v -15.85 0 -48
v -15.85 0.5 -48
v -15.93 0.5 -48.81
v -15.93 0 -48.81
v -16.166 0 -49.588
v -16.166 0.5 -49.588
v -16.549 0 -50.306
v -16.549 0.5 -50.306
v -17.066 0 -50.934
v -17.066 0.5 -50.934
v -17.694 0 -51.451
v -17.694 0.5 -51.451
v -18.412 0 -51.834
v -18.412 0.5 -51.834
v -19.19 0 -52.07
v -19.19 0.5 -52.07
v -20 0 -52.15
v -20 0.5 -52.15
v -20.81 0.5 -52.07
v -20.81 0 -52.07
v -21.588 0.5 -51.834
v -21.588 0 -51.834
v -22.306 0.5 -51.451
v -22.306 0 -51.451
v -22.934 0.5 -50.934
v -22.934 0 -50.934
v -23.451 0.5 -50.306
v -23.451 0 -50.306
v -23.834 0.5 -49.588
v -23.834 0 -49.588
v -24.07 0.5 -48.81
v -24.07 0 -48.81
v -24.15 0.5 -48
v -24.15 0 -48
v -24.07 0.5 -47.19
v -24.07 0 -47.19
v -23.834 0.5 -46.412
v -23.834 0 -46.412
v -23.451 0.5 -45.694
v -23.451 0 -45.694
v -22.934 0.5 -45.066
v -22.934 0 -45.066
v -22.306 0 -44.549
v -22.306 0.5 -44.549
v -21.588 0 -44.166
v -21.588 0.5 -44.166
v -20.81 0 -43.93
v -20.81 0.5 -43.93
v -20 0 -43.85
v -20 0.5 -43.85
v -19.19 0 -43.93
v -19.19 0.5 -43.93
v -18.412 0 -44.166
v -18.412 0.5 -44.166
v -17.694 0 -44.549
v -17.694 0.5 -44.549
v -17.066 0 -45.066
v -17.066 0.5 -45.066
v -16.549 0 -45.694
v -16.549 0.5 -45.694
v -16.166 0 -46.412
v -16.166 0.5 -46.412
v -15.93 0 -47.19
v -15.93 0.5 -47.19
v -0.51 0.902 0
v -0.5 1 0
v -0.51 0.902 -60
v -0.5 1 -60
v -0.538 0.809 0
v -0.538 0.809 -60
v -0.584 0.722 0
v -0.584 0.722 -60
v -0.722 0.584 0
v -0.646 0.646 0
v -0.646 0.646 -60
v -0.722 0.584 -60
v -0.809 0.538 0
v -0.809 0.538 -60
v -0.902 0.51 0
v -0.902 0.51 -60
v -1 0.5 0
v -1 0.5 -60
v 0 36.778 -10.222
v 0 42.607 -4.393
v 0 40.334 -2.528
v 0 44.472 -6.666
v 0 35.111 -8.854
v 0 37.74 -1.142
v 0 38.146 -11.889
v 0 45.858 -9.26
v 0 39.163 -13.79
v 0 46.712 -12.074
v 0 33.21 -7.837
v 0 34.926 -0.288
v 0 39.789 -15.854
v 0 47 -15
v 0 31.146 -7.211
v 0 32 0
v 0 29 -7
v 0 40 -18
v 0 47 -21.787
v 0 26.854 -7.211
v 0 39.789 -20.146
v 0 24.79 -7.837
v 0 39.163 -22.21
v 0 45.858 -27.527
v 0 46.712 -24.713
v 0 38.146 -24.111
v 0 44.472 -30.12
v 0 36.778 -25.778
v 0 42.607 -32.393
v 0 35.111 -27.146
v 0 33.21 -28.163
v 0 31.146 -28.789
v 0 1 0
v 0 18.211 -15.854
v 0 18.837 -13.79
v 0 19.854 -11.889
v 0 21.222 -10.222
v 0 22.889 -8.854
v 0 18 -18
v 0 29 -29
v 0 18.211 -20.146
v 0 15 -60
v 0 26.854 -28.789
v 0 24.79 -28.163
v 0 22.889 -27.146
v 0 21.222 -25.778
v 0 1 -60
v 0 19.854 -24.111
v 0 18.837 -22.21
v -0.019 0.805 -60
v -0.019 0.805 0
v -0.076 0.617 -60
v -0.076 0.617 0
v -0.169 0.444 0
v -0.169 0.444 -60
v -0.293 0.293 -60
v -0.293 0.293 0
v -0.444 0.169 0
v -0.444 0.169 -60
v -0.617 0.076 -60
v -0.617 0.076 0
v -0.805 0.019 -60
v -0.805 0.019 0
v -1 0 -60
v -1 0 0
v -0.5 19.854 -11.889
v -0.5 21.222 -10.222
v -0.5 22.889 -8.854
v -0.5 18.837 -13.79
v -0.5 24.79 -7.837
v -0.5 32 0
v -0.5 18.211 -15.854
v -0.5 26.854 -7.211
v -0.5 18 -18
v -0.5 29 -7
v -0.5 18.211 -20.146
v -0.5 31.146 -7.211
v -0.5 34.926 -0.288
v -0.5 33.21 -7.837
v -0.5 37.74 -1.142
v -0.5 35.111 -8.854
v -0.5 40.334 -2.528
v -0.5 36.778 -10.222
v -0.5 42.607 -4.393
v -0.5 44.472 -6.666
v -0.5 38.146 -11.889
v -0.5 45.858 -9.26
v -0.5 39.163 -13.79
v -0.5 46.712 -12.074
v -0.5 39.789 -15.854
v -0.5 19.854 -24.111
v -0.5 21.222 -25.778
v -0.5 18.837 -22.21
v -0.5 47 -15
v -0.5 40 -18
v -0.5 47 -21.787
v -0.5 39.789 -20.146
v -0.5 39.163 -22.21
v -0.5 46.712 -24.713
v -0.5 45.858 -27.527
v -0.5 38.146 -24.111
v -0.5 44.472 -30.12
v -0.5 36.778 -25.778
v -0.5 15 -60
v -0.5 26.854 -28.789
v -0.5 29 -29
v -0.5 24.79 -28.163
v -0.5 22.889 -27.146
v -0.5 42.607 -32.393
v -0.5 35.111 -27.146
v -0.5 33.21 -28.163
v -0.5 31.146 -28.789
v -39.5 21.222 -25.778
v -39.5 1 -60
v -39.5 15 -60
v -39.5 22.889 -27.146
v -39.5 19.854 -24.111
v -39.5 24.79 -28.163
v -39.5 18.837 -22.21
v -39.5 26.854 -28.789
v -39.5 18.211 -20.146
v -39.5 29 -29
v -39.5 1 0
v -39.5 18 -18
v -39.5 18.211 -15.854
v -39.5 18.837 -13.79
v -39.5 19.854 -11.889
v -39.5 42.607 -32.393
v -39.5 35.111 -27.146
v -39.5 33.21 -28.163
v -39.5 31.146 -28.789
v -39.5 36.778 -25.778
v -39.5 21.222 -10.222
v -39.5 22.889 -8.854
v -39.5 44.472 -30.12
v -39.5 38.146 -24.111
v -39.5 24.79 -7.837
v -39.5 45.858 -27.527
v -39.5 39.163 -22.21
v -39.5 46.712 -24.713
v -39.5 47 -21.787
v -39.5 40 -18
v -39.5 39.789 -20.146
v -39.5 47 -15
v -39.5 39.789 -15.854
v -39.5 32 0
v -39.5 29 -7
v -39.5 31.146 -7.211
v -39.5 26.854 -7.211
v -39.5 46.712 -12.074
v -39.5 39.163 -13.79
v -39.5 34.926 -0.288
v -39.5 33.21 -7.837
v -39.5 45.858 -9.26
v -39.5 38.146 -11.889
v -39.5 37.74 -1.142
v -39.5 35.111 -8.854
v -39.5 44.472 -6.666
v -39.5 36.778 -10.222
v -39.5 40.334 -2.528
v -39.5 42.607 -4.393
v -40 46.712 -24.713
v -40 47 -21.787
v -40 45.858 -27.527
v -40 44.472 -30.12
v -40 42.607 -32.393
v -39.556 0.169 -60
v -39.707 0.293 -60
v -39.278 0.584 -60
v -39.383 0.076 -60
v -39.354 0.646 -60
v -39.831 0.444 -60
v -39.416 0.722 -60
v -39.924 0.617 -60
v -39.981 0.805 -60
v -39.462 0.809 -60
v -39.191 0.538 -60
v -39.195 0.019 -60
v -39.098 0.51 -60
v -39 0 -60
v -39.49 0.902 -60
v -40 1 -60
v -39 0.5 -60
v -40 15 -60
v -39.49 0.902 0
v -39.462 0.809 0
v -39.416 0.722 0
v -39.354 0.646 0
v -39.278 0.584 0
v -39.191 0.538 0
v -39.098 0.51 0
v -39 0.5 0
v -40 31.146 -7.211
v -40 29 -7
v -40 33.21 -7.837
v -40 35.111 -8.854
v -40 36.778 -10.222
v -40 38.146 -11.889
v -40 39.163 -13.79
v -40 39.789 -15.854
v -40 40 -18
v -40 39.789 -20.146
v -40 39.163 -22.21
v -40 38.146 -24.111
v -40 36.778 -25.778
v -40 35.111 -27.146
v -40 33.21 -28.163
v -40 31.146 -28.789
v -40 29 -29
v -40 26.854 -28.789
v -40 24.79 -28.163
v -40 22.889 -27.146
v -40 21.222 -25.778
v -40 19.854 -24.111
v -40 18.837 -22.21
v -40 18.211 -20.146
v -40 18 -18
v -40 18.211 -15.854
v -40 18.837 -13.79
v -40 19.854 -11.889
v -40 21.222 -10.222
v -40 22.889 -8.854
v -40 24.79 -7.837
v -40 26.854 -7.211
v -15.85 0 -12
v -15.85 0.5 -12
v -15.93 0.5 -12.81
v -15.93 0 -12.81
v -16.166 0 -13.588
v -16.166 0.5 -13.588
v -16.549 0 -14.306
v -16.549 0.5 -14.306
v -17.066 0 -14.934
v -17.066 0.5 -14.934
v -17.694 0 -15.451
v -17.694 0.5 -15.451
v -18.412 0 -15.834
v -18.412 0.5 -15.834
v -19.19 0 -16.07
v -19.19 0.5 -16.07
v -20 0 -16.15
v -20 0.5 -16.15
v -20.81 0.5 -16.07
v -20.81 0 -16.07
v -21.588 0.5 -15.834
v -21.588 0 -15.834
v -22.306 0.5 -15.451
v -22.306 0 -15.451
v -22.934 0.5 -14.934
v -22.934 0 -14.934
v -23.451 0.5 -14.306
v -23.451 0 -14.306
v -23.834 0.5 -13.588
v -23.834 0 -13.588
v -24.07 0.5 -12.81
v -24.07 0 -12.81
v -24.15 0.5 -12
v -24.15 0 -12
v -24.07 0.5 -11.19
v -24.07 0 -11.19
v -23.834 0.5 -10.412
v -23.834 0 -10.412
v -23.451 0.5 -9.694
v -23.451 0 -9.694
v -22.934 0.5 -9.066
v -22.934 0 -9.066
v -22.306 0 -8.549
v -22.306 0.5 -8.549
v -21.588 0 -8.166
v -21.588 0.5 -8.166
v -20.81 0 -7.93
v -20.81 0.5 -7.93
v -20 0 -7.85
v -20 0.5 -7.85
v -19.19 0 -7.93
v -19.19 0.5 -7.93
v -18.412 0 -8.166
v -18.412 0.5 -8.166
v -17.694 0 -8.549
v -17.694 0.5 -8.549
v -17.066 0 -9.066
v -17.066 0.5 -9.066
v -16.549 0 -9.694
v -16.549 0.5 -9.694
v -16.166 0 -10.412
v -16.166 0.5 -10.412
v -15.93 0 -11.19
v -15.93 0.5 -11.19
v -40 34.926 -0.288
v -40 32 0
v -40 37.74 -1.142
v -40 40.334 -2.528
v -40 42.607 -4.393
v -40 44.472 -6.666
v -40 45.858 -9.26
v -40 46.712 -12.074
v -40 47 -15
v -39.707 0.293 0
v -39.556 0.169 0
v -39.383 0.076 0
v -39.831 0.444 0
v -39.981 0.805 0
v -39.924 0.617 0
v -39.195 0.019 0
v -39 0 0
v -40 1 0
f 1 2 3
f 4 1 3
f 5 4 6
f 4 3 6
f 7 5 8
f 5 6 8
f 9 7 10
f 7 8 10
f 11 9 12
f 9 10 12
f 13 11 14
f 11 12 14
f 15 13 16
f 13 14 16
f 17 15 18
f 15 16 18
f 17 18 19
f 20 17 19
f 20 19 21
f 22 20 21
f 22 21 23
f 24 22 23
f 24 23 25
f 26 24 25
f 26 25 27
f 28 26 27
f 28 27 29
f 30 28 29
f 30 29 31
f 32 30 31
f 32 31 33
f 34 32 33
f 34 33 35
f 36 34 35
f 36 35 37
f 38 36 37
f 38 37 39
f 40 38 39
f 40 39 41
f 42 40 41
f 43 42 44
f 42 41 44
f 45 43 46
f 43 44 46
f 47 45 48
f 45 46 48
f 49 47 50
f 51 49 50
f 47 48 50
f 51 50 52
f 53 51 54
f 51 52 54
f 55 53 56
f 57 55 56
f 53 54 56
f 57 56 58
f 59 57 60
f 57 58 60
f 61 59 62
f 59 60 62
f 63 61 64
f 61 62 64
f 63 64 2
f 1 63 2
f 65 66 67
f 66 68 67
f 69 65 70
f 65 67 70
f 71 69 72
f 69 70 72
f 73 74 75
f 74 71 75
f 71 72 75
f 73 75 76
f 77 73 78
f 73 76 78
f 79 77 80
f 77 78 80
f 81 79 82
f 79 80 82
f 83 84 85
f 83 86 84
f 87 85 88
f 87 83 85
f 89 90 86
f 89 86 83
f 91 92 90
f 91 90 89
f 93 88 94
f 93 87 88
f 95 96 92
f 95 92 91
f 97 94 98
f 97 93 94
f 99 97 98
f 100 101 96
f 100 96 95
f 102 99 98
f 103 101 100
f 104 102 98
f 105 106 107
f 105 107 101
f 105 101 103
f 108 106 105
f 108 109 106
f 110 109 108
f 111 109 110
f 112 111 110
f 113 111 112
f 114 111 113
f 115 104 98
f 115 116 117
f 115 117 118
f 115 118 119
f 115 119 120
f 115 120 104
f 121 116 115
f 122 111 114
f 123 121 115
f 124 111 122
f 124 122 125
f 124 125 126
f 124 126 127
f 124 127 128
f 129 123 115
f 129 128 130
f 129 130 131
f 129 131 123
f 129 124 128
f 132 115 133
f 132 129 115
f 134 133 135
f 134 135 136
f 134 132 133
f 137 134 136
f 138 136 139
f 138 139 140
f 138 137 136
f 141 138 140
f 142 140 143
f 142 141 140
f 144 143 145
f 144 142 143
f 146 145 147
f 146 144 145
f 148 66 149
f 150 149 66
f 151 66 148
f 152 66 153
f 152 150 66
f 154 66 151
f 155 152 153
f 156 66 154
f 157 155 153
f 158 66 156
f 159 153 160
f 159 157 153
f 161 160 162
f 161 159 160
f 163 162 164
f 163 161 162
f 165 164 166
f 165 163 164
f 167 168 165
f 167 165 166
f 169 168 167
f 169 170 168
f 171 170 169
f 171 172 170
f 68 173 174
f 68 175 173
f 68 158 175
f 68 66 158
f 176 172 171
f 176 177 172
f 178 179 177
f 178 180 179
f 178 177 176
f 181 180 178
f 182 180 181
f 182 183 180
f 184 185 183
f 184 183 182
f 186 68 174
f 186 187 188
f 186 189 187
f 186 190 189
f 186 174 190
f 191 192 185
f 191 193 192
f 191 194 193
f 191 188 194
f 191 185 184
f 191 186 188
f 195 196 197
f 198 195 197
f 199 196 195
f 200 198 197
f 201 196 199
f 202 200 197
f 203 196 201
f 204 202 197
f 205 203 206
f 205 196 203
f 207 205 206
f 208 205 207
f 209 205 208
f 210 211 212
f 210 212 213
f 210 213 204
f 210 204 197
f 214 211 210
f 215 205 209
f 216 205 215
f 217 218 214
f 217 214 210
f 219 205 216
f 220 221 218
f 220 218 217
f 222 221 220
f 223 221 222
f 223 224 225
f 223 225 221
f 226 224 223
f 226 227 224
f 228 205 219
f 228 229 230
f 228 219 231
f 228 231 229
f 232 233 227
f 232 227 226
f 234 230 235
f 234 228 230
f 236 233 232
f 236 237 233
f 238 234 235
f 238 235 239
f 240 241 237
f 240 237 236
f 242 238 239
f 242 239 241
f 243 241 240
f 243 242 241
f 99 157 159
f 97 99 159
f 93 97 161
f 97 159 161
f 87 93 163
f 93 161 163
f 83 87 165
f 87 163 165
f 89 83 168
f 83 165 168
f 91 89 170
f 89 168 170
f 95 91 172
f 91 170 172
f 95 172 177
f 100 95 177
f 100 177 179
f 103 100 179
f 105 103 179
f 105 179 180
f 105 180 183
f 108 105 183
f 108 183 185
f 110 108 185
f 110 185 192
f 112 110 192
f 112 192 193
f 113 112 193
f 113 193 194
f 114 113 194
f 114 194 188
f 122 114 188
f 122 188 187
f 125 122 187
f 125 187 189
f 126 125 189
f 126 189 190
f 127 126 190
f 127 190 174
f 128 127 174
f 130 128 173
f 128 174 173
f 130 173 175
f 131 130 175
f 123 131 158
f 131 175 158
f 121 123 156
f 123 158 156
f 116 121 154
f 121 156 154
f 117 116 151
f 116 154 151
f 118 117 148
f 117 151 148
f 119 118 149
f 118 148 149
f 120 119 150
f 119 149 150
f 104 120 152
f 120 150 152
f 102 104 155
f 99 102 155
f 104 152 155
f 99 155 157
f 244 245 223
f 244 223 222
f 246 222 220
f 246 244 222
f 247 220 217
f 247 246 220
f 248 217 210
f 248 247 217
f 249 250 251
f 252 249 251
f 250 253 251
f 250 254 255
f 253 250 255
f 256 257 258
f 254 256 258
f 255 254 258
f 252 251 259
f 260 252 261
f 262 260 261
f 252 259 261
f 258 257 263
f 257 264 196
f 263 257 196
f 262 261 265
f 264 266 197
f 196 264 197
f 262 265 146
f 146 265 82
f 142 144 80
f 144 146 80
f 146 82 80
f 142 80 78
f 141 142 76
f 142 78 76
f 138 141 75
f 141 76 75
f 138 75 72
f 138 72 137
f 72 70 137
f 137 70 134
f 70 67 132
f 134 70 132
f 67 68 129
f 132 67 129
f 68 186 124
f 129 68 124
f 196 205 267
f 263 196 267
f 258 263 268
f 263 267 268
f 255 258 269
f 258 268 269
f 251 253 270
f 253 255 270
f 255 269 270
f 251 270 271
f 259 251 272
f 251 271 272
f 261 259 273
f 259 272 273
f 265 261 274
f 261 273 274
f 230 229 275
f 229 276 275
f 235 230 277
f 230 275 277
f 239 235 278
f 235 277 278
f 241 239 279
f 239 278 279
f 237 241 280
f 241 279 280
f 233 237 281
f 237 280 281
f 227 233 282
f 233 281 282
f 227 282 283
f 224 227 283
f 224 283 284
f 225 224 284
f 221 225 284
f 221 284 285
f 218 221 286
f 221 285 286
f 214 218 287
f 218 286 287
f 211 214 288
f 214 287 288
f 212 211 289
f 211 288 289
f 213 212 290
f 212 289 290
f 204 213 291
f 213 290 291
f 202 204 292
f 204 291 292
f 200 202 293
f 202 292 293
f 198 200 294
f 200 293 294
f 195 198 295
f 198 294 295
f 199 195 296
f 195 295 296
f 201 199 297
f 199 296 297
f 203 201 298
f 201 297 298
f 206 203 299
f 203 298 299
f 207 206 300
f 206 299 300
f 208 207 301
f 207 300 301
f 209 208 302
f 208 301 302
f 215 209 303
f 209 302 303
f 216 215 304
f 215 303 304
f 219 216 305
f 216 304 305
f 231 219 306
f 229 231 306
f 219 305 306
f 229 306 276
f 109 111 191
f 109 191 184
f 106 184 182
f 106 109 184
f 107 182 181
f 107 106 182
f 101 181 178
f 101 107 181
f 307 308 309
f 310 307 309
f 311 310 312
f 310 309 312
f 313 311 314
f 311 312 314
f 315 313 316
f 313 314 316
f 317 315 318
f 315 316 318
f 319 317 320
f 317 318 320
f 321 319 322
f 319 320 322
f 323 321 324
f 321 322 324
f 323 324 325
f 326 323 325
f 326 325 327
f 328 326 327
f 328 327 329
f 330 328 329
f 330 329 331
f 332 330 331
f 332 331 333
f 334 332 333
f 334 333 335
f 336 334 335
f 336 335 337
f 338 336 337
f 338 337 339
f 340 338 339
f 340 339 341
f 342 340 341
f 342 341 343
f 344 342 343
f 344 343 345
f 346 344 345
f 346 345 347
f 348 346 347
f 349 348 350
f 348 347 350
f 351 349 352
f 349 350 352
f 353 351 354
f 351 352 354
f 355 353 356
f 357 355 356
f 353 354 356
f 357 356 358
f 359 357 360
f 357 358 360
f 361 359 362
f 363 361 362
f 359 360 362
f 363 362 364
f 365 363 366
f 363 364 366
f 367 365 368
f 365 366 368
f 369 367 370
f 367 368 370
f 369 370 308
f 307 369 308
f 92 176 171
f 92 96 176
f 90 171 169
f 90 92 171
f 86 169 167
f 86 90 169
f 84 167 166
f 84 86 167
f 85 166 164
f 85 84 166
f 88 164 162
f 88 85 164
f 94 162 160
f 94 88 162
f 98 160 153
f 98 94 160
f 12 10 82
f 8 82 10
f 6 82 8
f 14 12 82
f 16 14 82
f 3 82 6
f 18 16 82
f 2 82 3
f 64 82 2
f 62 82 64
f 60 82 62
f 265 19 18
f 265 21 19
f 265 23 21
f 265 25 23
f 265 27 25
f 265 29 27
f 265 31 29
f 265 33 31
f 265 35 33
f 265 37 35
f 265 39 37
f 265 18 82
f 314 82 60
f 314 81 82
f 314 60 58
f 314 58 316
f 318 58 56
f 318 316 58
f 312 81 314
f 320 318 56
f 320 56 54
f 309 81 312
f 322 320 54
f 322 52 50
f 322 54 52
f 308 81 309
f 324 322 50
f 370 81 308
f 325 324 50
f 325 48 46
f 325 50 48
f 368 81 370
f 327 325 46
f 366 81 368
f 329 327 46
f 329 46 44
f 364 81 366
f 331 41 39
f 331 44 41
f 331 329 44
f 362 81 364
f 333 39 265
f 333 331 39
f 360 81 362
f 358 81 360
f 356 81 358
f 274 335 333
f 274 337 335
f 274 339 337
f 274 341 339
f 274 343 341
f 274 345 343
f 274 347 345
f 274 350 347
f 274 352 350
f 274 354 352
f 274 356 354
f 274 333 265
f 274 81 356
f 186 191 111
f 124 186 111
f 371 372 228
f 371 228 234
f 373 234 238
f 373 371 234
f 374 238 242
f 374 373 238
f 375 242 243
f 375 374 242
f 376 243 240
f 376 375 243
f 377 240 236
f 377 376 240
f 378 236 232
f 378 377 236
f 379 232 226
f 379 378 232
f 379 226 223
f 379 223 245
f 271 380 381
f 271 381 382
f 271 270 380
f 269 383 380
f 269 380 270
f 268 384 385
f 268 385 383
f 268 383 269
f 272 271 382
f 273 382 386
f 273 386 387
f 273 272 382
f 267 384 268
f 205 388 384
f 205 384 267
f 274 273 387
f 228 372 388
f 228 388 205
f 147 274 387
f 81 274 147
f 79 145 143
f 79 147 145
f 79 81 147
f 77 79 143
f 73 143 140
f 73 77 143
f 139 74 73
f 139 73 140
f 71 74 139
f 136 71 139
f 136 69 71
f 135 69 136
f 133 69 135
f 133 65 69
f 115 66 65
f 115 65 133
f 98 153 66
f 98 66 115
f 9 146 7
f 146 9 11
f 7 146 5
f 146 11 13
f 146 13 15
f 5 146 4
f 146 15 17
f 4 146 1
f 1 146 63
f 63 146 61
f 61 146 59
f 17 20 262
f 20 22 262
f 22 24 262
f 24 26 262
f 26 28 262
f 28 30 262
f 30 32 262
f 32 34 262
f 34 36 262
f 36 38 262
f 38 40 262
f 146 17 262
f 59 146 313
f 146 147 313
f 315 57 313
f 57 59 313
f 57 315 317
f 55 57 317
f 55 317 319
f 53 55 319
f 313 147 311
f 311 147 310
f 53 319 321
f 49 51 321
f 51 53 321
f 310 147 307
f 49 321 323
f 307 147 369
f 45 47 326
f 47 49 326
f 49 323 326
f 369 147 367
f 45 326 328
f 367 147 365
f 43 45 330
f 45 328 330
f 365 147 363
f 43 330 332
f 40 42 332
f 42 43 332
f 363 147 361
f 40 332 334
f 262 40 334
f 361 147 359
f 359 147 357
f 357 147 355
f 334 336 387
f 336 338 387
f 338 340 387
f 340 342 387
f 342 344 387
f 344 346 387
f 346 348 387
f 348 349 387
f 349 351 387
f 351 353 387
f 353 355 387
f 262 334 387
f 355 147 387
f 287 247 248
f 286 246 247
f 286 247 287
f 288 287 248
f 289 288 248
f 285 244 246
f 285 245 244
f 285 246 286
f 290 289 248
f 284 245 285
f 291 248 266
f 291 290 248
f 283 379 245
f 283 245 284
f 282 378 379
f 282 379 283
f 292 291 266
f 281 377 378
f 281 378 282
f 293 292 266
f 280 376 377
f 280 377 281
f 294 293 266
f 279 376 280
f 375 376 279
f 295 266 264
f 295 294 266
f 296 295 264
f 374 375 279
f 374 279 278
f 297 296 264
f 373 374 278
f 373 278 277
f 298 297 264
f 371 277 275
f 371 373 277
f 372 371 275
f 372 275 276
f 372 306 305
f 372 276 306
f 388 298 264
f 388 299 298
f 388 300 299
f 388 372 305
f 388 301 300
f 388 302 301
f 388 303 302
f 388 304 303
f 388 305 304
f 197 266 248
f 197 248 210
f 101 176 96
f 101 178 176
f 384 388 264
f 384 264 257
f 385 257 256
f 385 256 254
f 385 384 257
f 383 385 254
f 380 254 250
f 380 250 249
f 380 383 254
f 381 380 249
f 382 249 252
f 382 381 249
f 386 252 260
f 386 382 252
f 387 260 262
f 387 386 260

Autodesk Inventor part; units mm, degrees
ref_plane "YZ Plane" through (0, 0, 0) normal (1, 0, 0) x (0, 1, 0)
ref_plane "XZ Plane" through (0, 0, 0) normal (0, 1, 0) x (-1, 0, 0)
ref_plane "XY Plane" through (0, 0, 0) normal (0, 0, 1) x (1, 0, 0)
sketch "Sketch1" plane through (0, 0, 0) normal (0, 1, 0) x (-1, 0, 0)
  line L0 (0, 0) -> (40, 0)
  line L1 (40, 0) -> (40, -60)
  line L2 (40, -60) -> (0, -60)
  line L3 (0, -60) -> (0, 0)
  dimension "d0" = 40
  dimension "d1" = 60
extrude "Plate1" add sketch "Sketch1" along normal blind 0.5
sketch "Sketch2" plane through (-39.5, 0, 0) normal (-1, 0, 0) x (0, -1, 0)
  line L0 (0, -60) -> (0, 0)
  line L1 (0, 0) -> (-47, 0)
  line L2 (-47, 0) -> (-47, -60)
  line L3 (-47, -60) -> (0, -60)
edge flange "Flange1" height 47 angle 90 thickness 0.5 bend radius 0.5 thickness toward (-1, 0, 0) relief tear relief width 0.5 relief depth 0.25 corner gap 0.5 corner form 0 edges at (-40, 0.5, -30) (0, 0.5, -30) wall of the first edge with corners at (-39.5, 0, -60) (-39.5, 0, 0) (-39.5, 47, 0) (-39.5, 47, -60)
bend "Bend1"
corner "Corner1"
sketch "Sketch4" plane through (-40, 47, -60) normal (-1, 0, 0) x (0, 0, 1)
  circle A0 centre (42, -18) radius 11
  line L0 (60, 0) -> (60, -46) projected
  line L1 (0, 0) -> (60, 0) projected
  point P0 (60, -47)
  dimension "d14" = 22
  dimension "d15" = 18
  dimension "d16" = 18
extrude "Cut1" cut sketch "Sketch4" against normal up to surface (40 mm away)
chamfer "Corner Chamfer1" distance 32 angle 45 2 edges at (-0.25, 47, -60) (-39.75, 47, -60)
fillet "Corner Round1" radius 15 4 edges at (-39.75, 47, -28) (-39.75, 47, 0) (-0.25, 47, 0) (-0.25, 47, -28)
sketch "Sketch5" plane through (0, 0.5, 0) normal (0, 1, 0) x (1, 0, 0)
  circle A0 centre (-20, 12) radius 4.15
  circle A1 centre (-20, 48) radius 4.15
  line L0 (-1, 0) -> (-39, 0) projected
  line L1 (-39, 60) -> (-1, 60) projected
  point P0 (0, 0)
  point P1 (-20, 0)
  dimension "d23" = 8.3
  dimension "d24" = 8.3
  dimension "d25" = 12
  dimension "d26" = 12
extrude "Cut2" cut sketch "Sketch5" against normal up to surface (0.5 mm away)
equation "\"d17\" = Thickness"
equation "\"d27\" = Thickness"
equation "\"d2\" = Thickness"
equation "\"d3\" = BendReliefWidth"
equation "\"d4\" = BendReliefDepth"
equation "\"d5\" = MinimumRemnant"
equation "\"d6\" = TransitionRadius"
equation "\"d9\" = BendRadius"
equation "\"d10\" = CornerReliefSize"
equation "\"d11\" = GapSize"
equation "\"d12\" = JacobiRadiusSize"
equation "\"BendRadius\" = Thickness"
equation "\"BendReliefWidth\" = Thickness"
equation "\"BendReliefDepth\" = 0.5 * Thickness"
equation "\"CornerReliefSize\" = 4 * Thickness"
equation "\"MinimumRemnant\" = 2 * Thickness"
equation "\"TransitionRadius\" = BendRadius"
equation "\"JacobiRadiusSize\" = BendRadius"
equation "\"GapSize\" = Thickness"
equation "\"A_width\" = 46"
equation "\"A_joint_diameter\" = 16"
equation "\"A_B_spacing\" = 2"
equation "\"A_joint_tolerance\" = 3"
equation "\"l___________\" = 0"
equation "\"l__________\" = 0"
equation "\"l_________\" = 0"
equation "\"rivet_diameter\" = 3.35"
equation "\"plate_thickness\" = 3"
equation "\"l________\" = 0"
equation "\"L_Piston_Top\" = 25"
equation "\"L_Piston_Bottom\" = 21"
equation "\"Thickness\" = 0.5"
properties part number "profile_mount-1"
